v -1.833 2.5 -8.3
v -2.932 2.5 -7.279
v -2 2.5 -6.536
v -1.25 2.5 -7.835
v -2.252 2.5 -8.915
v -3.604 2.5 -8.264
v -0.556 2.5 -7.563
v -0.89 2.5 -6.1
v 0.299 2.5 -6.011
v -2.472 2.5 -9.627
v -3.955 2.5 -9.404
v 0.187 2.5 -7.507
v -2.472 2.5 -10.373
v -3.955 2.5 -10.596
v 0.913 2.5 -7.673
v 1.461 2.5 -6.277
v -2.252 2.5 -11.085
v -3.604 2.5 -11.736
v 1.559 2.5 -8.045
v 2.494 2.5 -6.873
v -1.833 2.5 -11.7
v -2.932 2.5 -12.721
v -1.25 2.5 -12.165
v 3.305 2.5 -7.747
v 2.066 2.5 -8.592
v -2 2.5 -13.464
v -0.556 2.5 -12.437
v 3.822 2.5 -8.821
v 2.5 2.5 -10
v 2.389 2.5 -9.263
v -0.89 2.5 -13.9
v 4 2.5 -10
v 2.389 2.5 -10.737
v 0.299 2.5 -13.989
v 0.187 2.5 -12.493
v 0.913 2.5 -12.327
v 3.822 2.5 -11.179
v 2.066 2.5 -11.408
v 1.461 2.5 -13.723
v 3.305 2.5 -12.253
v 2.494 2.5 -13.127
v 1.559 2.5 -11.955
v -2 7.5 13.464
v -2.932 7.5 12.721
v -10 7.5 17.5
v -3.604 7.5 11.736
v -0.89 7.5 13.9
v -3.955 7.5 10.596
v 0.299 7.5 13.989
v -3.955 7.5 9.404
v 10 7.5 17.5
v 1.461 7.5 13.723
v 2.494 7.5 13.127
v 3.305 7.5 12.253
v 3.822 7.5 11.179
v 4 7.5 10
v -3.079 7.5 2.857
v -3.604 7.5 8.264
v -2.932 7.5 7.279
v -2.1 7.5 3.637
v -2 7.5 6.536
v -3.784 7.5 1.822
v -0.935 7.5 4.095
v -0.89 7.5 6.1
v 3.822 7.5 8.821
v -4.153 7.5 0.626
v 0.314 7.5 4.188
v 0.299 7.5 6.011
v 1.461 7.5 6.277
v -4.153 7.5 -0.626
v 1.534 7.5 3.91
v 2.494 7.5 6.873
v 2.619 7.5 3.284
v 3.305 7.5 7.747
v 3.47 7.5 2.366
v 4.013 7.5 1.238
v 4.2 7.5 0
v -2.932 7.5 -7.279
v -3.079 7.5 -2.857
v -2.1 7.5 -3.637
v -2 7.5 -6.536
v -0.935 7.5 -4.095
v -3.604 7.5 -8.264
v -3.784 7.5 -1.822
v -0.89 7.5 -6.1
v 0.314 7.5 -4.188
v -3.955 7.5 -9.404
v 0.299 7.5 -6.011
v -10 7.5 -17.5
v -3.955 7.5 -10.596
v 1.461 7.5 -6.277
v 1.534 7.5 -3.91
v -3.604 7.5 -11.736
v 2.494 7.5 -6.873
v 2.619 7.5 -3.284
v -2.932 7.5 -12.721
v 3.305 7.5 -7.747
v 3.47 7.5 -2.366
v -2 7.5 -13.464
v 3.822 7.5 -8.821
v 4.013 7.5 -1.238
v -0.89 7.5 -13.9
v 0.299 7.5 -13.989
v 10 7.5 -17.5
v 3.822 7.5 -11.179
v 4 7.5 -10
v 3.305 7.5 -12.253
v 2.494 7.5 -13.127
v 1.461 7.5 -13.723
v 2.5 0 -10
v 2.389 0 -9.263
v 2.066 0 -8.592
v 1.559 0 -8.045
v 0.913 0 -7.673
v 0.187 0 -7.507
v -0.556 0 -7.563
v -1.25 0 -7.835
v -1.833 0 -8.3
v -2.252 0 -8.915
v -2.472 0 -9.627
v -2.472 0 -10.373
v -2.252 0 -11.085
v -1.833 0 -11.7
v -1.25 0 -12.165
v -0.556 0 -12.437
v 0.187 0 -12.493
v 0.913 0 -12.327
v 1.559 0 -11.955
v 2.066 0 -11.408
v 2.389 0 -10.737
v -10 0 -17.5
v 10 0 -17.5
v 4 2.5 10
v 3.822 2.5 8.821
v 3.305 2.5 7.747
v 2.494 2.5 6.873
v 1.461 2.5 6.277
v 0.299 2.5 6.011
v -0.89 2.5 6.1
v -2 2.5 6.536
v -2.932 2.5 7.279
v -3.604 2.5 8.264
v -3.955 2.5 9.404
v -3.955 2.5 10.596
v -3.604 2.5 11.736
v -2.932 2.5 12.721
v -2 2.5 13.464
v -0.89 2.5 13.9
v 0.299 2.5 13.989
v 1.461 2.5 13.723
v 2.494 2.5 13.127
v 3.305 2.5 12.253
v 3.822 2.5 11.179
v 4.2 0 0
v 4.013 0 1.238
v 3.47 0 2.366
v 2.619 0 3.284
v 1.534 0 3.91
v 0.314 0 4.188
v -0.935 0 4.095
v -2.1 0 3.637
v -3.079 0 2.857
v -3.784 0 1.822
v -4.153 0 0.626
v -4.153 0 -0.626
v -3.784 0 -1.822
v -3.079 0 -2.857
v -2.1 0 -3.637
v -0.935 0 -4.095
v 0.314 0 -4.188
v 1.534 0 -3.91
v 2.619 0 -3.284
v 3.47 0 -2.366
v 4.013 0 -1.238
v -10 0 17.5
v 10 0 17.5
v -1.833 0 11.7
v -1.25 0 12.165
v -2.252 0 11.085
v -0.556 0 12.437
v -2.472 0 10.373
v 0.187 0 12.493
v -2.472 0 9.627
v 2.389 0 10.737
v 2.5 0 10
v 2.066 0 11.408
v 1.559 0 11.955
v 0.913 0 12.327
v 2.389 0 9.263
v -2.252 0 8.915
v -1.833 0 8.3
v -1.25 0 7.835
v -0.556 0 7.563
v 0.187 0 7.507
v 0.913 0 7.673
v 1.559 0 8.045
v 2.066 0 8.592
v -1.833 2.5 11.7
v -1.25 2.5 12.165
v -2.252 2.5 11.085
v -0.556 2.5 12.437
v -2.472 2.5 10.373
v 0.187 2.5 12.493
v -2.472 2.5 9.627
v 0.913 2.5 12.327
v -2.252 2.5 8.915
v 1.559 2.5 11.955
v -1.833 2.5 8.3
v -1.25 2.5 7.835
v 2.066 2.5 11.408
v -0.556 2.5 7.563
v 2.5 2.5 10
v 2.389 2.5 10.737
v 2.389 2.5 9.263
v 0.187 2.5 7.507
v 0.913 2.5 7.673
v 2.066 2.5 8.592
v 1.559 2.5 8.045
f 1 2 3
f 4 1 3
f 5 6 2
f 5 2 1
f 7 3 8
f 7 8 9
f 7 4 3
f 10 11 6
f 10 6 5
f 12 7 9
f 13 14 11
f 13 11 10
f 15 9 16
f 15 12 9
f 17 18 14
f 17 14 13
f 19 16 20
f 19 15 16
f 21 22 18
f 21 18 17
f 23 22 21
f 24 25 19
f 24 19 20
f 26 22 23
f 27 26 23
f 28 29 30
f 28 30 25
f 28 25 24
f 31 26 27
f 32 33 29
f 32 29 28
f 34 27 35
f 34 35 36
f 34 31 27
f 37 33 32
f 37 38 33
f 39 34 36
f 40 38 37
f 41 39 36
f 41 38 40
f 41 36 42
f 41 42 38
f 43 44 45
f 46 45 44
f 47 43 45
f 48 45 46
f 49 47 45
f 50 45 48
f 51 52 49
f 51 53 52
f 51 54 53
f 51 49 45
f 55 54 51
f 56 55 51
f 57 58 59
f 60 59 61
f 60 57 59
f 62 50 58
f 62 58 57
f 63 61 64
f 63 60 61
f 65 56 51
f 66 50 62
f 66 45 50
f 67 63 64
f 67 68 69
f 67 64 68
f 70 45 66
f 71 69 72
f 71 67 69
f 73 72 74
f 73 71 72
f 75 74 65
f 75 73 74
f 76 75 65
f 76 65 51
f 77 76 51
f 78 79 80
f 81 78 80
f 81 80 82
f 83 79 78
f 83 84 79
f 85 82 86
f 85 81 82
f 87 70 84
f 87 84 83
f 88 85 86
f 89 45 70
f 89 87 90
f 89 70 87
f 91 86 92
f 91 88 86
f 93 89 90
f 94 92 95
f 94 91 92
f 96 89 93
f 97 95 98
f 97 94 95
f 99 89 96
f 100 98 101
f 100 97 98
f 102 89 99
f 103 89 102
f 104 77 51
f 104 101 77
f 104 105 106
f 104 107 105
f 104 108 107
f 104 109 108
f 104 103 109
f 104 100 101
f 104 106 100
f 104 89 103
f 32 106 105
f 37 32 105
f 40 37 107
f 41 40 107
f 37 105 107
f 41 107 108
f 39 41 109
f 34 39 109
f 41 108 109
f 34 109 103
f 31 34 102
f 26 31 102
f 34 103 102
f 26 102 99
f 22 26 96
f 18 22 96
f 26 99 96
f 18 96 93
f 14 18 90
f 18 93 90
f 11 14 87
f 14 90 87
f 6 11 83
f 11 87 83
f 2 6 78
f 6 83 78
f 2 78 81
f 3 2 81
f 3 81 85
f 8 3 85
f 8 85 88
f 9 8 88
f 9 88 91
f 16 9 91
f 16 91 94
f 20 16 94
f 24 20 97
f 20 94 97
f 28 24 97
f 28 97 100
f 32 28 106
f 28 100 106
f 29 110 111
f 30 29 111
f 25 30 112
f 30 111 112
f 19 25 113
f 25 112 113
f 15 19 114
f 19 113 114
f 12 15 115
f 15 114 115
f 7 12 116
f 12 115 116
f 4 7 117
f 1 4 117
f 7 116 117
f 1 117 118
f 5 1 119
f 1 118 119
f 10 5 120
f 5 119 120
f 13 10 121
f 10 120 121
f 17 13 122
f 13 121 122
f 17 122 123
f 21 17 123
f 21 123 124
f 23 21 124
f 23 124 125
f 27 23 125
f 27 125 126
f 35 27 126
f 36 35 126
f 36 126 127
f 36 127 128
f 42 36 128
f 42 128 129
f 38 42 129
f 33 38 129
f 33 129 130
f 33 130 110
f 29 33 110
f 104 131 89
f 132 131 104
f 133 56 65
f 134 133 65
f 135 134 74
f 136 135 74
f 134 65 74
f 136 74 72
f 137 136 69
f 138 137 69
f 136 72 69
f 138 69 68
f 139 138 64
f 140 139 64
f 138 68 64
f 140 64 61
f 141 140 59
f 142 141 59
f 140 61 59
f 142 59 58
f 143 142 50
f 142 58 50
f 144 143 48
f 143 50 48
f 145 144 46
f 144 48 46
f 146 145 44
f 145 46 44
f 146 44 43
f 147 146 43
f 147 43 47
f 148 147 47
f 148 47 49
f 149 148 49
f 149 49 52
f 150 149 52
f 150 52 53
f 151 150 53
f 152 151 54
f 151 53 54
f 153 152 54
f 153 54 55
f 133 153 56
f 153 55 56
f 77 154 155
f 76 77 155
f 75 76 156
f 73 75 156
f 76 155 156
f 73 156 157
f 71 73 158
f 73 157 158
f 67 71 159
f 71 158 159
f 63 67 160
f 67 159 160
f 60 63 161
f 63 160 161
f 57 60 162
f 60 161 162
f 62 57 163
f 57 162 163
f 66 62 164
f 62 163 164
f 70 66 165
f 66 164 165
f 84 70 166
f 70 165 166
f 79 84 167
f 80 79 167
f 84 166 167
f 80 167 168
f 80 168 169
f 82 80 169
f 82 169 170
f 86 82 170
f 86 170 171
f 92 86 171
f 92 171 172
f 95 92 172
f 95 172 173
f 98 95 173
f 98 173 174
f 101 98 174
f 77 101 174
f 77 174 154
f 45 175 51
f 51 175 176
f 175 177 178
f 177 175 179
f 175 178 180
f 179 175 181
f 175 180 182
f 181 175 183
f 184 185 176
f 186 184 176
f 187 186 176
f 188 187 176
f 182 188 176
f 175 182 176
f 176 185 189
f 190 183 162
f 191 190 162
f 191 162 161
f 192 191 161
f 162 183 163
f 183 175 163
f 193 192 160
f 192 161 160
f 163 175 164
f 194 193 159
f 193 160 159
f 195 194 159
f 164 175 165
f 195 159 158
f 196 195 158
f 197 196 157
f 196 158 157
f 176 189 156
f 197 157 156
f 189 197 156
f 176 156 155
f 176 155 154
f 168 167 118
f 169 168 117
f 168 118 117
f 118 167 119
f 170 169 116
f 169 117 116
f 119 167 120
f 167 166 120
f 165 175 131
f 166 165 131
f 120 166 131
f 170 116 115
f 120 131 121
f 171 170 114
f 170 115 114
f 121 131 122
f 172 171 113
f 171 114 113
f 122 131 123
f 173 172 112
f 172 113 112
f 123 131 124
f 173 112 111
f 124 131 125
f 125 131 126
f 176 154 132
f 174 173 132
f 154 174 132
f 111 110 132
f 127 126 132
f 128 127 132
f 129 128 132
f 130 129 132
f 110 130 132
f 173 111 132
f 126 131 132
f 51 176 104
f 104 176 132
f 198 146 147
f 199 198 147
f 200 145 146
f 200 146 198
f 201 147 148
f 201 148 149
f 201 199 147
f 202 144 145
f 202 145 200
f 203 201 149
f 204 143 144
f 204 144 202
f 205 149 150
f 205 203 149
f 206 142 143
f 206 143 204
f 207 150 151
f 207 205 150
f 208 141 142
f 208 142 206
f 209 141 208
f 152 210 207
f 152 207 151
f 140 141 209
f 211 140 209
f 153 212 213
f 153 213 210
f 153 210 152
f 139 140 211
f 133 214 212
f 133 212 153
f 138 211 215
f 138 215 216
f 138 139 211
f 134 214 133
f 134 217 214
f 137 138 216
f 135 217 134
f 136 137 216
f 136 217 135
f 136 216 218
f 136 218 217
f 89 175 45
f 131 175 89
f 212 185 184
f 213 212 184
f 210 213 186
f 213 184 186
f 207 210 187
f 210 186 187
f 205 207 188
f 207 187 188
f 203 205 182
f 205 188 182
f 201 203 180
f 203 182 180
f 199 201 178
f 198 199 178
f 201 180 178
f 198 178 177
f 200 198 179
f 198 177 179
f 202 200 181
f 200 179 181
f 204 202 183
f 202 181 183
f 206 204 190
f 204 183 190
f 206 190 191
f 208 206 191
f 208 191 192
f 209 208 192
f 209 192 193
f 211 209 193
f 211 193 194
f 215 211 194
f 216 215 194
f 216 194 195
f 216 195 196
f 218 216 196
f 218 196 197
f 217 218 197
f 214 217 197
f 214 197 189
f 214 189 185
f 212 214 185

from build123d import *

# Parameters (mm, degrees)
SKETCH1_W           = 20
SKETCH1_H           = 35
BOSS_EXTRUDE1_DEPTH = 7.5
SKETCH3_R           = 4.2
CUT_EXTRUDE1_DEPTH  = 8.5
SKETCH5_R           = 2.5
CUT_EXTRUDE2_DEPTH  = 8.5
SKETCH6_R           = 4
CUT_EXTRUDE3_DEPTH  = 5


with BuildPart() as part:
    # Sketch1 → Boss-Extrude1 (new body)
    with BuildSketch(Plane(origin=(0, 0, 0), x_dir=(1, 0, 0), z_dir=(0, 1, 0))):
        Rectangle(SKETCH1_W, SKETCH1_H)
    extrude(amount=BOSS_EXTRUDE1_DEPTH)

    # Sketch3 → Cut-Extrude1 (cut, through all)
    with BuildSketch(Plane.XZ):
        Circle(SKETCH3_R)
    extrude(amount=-CUT_EXTRUDE1_DEPTH, mode=Mode.SUBTRACT)

    # Sketch5 → Cut-Extrude2 (cut, through all)
    with BuildSketch(Plane.XZ):
        with Locations((0, 10)):
            Circle(SKETCH5_R)
        with Locations((0, -10)):
            Circle(SKETCH5_R)
    extrude(amount=-CUT_EXTRUDE2_DEPTH, mode=Mode.SUBTRACT)

    # Sketch6 → Cut-Extrude3 (cut)
    with BuildSketch(Plane(origin=(0, 7.5, 0), x_dir=(1, 0, 0), z_dir=(0, 1, 0))):
        with Locations((0, 10)):
            Circle(SKETCH6_R)
        with Locations((0, -10)):
            Circle(SKETCH6_R)
    extrude(amount=-CUT_EXTRUDE3_DEPTH, mode=Mode.SUBTRACT)


solid = part.part
